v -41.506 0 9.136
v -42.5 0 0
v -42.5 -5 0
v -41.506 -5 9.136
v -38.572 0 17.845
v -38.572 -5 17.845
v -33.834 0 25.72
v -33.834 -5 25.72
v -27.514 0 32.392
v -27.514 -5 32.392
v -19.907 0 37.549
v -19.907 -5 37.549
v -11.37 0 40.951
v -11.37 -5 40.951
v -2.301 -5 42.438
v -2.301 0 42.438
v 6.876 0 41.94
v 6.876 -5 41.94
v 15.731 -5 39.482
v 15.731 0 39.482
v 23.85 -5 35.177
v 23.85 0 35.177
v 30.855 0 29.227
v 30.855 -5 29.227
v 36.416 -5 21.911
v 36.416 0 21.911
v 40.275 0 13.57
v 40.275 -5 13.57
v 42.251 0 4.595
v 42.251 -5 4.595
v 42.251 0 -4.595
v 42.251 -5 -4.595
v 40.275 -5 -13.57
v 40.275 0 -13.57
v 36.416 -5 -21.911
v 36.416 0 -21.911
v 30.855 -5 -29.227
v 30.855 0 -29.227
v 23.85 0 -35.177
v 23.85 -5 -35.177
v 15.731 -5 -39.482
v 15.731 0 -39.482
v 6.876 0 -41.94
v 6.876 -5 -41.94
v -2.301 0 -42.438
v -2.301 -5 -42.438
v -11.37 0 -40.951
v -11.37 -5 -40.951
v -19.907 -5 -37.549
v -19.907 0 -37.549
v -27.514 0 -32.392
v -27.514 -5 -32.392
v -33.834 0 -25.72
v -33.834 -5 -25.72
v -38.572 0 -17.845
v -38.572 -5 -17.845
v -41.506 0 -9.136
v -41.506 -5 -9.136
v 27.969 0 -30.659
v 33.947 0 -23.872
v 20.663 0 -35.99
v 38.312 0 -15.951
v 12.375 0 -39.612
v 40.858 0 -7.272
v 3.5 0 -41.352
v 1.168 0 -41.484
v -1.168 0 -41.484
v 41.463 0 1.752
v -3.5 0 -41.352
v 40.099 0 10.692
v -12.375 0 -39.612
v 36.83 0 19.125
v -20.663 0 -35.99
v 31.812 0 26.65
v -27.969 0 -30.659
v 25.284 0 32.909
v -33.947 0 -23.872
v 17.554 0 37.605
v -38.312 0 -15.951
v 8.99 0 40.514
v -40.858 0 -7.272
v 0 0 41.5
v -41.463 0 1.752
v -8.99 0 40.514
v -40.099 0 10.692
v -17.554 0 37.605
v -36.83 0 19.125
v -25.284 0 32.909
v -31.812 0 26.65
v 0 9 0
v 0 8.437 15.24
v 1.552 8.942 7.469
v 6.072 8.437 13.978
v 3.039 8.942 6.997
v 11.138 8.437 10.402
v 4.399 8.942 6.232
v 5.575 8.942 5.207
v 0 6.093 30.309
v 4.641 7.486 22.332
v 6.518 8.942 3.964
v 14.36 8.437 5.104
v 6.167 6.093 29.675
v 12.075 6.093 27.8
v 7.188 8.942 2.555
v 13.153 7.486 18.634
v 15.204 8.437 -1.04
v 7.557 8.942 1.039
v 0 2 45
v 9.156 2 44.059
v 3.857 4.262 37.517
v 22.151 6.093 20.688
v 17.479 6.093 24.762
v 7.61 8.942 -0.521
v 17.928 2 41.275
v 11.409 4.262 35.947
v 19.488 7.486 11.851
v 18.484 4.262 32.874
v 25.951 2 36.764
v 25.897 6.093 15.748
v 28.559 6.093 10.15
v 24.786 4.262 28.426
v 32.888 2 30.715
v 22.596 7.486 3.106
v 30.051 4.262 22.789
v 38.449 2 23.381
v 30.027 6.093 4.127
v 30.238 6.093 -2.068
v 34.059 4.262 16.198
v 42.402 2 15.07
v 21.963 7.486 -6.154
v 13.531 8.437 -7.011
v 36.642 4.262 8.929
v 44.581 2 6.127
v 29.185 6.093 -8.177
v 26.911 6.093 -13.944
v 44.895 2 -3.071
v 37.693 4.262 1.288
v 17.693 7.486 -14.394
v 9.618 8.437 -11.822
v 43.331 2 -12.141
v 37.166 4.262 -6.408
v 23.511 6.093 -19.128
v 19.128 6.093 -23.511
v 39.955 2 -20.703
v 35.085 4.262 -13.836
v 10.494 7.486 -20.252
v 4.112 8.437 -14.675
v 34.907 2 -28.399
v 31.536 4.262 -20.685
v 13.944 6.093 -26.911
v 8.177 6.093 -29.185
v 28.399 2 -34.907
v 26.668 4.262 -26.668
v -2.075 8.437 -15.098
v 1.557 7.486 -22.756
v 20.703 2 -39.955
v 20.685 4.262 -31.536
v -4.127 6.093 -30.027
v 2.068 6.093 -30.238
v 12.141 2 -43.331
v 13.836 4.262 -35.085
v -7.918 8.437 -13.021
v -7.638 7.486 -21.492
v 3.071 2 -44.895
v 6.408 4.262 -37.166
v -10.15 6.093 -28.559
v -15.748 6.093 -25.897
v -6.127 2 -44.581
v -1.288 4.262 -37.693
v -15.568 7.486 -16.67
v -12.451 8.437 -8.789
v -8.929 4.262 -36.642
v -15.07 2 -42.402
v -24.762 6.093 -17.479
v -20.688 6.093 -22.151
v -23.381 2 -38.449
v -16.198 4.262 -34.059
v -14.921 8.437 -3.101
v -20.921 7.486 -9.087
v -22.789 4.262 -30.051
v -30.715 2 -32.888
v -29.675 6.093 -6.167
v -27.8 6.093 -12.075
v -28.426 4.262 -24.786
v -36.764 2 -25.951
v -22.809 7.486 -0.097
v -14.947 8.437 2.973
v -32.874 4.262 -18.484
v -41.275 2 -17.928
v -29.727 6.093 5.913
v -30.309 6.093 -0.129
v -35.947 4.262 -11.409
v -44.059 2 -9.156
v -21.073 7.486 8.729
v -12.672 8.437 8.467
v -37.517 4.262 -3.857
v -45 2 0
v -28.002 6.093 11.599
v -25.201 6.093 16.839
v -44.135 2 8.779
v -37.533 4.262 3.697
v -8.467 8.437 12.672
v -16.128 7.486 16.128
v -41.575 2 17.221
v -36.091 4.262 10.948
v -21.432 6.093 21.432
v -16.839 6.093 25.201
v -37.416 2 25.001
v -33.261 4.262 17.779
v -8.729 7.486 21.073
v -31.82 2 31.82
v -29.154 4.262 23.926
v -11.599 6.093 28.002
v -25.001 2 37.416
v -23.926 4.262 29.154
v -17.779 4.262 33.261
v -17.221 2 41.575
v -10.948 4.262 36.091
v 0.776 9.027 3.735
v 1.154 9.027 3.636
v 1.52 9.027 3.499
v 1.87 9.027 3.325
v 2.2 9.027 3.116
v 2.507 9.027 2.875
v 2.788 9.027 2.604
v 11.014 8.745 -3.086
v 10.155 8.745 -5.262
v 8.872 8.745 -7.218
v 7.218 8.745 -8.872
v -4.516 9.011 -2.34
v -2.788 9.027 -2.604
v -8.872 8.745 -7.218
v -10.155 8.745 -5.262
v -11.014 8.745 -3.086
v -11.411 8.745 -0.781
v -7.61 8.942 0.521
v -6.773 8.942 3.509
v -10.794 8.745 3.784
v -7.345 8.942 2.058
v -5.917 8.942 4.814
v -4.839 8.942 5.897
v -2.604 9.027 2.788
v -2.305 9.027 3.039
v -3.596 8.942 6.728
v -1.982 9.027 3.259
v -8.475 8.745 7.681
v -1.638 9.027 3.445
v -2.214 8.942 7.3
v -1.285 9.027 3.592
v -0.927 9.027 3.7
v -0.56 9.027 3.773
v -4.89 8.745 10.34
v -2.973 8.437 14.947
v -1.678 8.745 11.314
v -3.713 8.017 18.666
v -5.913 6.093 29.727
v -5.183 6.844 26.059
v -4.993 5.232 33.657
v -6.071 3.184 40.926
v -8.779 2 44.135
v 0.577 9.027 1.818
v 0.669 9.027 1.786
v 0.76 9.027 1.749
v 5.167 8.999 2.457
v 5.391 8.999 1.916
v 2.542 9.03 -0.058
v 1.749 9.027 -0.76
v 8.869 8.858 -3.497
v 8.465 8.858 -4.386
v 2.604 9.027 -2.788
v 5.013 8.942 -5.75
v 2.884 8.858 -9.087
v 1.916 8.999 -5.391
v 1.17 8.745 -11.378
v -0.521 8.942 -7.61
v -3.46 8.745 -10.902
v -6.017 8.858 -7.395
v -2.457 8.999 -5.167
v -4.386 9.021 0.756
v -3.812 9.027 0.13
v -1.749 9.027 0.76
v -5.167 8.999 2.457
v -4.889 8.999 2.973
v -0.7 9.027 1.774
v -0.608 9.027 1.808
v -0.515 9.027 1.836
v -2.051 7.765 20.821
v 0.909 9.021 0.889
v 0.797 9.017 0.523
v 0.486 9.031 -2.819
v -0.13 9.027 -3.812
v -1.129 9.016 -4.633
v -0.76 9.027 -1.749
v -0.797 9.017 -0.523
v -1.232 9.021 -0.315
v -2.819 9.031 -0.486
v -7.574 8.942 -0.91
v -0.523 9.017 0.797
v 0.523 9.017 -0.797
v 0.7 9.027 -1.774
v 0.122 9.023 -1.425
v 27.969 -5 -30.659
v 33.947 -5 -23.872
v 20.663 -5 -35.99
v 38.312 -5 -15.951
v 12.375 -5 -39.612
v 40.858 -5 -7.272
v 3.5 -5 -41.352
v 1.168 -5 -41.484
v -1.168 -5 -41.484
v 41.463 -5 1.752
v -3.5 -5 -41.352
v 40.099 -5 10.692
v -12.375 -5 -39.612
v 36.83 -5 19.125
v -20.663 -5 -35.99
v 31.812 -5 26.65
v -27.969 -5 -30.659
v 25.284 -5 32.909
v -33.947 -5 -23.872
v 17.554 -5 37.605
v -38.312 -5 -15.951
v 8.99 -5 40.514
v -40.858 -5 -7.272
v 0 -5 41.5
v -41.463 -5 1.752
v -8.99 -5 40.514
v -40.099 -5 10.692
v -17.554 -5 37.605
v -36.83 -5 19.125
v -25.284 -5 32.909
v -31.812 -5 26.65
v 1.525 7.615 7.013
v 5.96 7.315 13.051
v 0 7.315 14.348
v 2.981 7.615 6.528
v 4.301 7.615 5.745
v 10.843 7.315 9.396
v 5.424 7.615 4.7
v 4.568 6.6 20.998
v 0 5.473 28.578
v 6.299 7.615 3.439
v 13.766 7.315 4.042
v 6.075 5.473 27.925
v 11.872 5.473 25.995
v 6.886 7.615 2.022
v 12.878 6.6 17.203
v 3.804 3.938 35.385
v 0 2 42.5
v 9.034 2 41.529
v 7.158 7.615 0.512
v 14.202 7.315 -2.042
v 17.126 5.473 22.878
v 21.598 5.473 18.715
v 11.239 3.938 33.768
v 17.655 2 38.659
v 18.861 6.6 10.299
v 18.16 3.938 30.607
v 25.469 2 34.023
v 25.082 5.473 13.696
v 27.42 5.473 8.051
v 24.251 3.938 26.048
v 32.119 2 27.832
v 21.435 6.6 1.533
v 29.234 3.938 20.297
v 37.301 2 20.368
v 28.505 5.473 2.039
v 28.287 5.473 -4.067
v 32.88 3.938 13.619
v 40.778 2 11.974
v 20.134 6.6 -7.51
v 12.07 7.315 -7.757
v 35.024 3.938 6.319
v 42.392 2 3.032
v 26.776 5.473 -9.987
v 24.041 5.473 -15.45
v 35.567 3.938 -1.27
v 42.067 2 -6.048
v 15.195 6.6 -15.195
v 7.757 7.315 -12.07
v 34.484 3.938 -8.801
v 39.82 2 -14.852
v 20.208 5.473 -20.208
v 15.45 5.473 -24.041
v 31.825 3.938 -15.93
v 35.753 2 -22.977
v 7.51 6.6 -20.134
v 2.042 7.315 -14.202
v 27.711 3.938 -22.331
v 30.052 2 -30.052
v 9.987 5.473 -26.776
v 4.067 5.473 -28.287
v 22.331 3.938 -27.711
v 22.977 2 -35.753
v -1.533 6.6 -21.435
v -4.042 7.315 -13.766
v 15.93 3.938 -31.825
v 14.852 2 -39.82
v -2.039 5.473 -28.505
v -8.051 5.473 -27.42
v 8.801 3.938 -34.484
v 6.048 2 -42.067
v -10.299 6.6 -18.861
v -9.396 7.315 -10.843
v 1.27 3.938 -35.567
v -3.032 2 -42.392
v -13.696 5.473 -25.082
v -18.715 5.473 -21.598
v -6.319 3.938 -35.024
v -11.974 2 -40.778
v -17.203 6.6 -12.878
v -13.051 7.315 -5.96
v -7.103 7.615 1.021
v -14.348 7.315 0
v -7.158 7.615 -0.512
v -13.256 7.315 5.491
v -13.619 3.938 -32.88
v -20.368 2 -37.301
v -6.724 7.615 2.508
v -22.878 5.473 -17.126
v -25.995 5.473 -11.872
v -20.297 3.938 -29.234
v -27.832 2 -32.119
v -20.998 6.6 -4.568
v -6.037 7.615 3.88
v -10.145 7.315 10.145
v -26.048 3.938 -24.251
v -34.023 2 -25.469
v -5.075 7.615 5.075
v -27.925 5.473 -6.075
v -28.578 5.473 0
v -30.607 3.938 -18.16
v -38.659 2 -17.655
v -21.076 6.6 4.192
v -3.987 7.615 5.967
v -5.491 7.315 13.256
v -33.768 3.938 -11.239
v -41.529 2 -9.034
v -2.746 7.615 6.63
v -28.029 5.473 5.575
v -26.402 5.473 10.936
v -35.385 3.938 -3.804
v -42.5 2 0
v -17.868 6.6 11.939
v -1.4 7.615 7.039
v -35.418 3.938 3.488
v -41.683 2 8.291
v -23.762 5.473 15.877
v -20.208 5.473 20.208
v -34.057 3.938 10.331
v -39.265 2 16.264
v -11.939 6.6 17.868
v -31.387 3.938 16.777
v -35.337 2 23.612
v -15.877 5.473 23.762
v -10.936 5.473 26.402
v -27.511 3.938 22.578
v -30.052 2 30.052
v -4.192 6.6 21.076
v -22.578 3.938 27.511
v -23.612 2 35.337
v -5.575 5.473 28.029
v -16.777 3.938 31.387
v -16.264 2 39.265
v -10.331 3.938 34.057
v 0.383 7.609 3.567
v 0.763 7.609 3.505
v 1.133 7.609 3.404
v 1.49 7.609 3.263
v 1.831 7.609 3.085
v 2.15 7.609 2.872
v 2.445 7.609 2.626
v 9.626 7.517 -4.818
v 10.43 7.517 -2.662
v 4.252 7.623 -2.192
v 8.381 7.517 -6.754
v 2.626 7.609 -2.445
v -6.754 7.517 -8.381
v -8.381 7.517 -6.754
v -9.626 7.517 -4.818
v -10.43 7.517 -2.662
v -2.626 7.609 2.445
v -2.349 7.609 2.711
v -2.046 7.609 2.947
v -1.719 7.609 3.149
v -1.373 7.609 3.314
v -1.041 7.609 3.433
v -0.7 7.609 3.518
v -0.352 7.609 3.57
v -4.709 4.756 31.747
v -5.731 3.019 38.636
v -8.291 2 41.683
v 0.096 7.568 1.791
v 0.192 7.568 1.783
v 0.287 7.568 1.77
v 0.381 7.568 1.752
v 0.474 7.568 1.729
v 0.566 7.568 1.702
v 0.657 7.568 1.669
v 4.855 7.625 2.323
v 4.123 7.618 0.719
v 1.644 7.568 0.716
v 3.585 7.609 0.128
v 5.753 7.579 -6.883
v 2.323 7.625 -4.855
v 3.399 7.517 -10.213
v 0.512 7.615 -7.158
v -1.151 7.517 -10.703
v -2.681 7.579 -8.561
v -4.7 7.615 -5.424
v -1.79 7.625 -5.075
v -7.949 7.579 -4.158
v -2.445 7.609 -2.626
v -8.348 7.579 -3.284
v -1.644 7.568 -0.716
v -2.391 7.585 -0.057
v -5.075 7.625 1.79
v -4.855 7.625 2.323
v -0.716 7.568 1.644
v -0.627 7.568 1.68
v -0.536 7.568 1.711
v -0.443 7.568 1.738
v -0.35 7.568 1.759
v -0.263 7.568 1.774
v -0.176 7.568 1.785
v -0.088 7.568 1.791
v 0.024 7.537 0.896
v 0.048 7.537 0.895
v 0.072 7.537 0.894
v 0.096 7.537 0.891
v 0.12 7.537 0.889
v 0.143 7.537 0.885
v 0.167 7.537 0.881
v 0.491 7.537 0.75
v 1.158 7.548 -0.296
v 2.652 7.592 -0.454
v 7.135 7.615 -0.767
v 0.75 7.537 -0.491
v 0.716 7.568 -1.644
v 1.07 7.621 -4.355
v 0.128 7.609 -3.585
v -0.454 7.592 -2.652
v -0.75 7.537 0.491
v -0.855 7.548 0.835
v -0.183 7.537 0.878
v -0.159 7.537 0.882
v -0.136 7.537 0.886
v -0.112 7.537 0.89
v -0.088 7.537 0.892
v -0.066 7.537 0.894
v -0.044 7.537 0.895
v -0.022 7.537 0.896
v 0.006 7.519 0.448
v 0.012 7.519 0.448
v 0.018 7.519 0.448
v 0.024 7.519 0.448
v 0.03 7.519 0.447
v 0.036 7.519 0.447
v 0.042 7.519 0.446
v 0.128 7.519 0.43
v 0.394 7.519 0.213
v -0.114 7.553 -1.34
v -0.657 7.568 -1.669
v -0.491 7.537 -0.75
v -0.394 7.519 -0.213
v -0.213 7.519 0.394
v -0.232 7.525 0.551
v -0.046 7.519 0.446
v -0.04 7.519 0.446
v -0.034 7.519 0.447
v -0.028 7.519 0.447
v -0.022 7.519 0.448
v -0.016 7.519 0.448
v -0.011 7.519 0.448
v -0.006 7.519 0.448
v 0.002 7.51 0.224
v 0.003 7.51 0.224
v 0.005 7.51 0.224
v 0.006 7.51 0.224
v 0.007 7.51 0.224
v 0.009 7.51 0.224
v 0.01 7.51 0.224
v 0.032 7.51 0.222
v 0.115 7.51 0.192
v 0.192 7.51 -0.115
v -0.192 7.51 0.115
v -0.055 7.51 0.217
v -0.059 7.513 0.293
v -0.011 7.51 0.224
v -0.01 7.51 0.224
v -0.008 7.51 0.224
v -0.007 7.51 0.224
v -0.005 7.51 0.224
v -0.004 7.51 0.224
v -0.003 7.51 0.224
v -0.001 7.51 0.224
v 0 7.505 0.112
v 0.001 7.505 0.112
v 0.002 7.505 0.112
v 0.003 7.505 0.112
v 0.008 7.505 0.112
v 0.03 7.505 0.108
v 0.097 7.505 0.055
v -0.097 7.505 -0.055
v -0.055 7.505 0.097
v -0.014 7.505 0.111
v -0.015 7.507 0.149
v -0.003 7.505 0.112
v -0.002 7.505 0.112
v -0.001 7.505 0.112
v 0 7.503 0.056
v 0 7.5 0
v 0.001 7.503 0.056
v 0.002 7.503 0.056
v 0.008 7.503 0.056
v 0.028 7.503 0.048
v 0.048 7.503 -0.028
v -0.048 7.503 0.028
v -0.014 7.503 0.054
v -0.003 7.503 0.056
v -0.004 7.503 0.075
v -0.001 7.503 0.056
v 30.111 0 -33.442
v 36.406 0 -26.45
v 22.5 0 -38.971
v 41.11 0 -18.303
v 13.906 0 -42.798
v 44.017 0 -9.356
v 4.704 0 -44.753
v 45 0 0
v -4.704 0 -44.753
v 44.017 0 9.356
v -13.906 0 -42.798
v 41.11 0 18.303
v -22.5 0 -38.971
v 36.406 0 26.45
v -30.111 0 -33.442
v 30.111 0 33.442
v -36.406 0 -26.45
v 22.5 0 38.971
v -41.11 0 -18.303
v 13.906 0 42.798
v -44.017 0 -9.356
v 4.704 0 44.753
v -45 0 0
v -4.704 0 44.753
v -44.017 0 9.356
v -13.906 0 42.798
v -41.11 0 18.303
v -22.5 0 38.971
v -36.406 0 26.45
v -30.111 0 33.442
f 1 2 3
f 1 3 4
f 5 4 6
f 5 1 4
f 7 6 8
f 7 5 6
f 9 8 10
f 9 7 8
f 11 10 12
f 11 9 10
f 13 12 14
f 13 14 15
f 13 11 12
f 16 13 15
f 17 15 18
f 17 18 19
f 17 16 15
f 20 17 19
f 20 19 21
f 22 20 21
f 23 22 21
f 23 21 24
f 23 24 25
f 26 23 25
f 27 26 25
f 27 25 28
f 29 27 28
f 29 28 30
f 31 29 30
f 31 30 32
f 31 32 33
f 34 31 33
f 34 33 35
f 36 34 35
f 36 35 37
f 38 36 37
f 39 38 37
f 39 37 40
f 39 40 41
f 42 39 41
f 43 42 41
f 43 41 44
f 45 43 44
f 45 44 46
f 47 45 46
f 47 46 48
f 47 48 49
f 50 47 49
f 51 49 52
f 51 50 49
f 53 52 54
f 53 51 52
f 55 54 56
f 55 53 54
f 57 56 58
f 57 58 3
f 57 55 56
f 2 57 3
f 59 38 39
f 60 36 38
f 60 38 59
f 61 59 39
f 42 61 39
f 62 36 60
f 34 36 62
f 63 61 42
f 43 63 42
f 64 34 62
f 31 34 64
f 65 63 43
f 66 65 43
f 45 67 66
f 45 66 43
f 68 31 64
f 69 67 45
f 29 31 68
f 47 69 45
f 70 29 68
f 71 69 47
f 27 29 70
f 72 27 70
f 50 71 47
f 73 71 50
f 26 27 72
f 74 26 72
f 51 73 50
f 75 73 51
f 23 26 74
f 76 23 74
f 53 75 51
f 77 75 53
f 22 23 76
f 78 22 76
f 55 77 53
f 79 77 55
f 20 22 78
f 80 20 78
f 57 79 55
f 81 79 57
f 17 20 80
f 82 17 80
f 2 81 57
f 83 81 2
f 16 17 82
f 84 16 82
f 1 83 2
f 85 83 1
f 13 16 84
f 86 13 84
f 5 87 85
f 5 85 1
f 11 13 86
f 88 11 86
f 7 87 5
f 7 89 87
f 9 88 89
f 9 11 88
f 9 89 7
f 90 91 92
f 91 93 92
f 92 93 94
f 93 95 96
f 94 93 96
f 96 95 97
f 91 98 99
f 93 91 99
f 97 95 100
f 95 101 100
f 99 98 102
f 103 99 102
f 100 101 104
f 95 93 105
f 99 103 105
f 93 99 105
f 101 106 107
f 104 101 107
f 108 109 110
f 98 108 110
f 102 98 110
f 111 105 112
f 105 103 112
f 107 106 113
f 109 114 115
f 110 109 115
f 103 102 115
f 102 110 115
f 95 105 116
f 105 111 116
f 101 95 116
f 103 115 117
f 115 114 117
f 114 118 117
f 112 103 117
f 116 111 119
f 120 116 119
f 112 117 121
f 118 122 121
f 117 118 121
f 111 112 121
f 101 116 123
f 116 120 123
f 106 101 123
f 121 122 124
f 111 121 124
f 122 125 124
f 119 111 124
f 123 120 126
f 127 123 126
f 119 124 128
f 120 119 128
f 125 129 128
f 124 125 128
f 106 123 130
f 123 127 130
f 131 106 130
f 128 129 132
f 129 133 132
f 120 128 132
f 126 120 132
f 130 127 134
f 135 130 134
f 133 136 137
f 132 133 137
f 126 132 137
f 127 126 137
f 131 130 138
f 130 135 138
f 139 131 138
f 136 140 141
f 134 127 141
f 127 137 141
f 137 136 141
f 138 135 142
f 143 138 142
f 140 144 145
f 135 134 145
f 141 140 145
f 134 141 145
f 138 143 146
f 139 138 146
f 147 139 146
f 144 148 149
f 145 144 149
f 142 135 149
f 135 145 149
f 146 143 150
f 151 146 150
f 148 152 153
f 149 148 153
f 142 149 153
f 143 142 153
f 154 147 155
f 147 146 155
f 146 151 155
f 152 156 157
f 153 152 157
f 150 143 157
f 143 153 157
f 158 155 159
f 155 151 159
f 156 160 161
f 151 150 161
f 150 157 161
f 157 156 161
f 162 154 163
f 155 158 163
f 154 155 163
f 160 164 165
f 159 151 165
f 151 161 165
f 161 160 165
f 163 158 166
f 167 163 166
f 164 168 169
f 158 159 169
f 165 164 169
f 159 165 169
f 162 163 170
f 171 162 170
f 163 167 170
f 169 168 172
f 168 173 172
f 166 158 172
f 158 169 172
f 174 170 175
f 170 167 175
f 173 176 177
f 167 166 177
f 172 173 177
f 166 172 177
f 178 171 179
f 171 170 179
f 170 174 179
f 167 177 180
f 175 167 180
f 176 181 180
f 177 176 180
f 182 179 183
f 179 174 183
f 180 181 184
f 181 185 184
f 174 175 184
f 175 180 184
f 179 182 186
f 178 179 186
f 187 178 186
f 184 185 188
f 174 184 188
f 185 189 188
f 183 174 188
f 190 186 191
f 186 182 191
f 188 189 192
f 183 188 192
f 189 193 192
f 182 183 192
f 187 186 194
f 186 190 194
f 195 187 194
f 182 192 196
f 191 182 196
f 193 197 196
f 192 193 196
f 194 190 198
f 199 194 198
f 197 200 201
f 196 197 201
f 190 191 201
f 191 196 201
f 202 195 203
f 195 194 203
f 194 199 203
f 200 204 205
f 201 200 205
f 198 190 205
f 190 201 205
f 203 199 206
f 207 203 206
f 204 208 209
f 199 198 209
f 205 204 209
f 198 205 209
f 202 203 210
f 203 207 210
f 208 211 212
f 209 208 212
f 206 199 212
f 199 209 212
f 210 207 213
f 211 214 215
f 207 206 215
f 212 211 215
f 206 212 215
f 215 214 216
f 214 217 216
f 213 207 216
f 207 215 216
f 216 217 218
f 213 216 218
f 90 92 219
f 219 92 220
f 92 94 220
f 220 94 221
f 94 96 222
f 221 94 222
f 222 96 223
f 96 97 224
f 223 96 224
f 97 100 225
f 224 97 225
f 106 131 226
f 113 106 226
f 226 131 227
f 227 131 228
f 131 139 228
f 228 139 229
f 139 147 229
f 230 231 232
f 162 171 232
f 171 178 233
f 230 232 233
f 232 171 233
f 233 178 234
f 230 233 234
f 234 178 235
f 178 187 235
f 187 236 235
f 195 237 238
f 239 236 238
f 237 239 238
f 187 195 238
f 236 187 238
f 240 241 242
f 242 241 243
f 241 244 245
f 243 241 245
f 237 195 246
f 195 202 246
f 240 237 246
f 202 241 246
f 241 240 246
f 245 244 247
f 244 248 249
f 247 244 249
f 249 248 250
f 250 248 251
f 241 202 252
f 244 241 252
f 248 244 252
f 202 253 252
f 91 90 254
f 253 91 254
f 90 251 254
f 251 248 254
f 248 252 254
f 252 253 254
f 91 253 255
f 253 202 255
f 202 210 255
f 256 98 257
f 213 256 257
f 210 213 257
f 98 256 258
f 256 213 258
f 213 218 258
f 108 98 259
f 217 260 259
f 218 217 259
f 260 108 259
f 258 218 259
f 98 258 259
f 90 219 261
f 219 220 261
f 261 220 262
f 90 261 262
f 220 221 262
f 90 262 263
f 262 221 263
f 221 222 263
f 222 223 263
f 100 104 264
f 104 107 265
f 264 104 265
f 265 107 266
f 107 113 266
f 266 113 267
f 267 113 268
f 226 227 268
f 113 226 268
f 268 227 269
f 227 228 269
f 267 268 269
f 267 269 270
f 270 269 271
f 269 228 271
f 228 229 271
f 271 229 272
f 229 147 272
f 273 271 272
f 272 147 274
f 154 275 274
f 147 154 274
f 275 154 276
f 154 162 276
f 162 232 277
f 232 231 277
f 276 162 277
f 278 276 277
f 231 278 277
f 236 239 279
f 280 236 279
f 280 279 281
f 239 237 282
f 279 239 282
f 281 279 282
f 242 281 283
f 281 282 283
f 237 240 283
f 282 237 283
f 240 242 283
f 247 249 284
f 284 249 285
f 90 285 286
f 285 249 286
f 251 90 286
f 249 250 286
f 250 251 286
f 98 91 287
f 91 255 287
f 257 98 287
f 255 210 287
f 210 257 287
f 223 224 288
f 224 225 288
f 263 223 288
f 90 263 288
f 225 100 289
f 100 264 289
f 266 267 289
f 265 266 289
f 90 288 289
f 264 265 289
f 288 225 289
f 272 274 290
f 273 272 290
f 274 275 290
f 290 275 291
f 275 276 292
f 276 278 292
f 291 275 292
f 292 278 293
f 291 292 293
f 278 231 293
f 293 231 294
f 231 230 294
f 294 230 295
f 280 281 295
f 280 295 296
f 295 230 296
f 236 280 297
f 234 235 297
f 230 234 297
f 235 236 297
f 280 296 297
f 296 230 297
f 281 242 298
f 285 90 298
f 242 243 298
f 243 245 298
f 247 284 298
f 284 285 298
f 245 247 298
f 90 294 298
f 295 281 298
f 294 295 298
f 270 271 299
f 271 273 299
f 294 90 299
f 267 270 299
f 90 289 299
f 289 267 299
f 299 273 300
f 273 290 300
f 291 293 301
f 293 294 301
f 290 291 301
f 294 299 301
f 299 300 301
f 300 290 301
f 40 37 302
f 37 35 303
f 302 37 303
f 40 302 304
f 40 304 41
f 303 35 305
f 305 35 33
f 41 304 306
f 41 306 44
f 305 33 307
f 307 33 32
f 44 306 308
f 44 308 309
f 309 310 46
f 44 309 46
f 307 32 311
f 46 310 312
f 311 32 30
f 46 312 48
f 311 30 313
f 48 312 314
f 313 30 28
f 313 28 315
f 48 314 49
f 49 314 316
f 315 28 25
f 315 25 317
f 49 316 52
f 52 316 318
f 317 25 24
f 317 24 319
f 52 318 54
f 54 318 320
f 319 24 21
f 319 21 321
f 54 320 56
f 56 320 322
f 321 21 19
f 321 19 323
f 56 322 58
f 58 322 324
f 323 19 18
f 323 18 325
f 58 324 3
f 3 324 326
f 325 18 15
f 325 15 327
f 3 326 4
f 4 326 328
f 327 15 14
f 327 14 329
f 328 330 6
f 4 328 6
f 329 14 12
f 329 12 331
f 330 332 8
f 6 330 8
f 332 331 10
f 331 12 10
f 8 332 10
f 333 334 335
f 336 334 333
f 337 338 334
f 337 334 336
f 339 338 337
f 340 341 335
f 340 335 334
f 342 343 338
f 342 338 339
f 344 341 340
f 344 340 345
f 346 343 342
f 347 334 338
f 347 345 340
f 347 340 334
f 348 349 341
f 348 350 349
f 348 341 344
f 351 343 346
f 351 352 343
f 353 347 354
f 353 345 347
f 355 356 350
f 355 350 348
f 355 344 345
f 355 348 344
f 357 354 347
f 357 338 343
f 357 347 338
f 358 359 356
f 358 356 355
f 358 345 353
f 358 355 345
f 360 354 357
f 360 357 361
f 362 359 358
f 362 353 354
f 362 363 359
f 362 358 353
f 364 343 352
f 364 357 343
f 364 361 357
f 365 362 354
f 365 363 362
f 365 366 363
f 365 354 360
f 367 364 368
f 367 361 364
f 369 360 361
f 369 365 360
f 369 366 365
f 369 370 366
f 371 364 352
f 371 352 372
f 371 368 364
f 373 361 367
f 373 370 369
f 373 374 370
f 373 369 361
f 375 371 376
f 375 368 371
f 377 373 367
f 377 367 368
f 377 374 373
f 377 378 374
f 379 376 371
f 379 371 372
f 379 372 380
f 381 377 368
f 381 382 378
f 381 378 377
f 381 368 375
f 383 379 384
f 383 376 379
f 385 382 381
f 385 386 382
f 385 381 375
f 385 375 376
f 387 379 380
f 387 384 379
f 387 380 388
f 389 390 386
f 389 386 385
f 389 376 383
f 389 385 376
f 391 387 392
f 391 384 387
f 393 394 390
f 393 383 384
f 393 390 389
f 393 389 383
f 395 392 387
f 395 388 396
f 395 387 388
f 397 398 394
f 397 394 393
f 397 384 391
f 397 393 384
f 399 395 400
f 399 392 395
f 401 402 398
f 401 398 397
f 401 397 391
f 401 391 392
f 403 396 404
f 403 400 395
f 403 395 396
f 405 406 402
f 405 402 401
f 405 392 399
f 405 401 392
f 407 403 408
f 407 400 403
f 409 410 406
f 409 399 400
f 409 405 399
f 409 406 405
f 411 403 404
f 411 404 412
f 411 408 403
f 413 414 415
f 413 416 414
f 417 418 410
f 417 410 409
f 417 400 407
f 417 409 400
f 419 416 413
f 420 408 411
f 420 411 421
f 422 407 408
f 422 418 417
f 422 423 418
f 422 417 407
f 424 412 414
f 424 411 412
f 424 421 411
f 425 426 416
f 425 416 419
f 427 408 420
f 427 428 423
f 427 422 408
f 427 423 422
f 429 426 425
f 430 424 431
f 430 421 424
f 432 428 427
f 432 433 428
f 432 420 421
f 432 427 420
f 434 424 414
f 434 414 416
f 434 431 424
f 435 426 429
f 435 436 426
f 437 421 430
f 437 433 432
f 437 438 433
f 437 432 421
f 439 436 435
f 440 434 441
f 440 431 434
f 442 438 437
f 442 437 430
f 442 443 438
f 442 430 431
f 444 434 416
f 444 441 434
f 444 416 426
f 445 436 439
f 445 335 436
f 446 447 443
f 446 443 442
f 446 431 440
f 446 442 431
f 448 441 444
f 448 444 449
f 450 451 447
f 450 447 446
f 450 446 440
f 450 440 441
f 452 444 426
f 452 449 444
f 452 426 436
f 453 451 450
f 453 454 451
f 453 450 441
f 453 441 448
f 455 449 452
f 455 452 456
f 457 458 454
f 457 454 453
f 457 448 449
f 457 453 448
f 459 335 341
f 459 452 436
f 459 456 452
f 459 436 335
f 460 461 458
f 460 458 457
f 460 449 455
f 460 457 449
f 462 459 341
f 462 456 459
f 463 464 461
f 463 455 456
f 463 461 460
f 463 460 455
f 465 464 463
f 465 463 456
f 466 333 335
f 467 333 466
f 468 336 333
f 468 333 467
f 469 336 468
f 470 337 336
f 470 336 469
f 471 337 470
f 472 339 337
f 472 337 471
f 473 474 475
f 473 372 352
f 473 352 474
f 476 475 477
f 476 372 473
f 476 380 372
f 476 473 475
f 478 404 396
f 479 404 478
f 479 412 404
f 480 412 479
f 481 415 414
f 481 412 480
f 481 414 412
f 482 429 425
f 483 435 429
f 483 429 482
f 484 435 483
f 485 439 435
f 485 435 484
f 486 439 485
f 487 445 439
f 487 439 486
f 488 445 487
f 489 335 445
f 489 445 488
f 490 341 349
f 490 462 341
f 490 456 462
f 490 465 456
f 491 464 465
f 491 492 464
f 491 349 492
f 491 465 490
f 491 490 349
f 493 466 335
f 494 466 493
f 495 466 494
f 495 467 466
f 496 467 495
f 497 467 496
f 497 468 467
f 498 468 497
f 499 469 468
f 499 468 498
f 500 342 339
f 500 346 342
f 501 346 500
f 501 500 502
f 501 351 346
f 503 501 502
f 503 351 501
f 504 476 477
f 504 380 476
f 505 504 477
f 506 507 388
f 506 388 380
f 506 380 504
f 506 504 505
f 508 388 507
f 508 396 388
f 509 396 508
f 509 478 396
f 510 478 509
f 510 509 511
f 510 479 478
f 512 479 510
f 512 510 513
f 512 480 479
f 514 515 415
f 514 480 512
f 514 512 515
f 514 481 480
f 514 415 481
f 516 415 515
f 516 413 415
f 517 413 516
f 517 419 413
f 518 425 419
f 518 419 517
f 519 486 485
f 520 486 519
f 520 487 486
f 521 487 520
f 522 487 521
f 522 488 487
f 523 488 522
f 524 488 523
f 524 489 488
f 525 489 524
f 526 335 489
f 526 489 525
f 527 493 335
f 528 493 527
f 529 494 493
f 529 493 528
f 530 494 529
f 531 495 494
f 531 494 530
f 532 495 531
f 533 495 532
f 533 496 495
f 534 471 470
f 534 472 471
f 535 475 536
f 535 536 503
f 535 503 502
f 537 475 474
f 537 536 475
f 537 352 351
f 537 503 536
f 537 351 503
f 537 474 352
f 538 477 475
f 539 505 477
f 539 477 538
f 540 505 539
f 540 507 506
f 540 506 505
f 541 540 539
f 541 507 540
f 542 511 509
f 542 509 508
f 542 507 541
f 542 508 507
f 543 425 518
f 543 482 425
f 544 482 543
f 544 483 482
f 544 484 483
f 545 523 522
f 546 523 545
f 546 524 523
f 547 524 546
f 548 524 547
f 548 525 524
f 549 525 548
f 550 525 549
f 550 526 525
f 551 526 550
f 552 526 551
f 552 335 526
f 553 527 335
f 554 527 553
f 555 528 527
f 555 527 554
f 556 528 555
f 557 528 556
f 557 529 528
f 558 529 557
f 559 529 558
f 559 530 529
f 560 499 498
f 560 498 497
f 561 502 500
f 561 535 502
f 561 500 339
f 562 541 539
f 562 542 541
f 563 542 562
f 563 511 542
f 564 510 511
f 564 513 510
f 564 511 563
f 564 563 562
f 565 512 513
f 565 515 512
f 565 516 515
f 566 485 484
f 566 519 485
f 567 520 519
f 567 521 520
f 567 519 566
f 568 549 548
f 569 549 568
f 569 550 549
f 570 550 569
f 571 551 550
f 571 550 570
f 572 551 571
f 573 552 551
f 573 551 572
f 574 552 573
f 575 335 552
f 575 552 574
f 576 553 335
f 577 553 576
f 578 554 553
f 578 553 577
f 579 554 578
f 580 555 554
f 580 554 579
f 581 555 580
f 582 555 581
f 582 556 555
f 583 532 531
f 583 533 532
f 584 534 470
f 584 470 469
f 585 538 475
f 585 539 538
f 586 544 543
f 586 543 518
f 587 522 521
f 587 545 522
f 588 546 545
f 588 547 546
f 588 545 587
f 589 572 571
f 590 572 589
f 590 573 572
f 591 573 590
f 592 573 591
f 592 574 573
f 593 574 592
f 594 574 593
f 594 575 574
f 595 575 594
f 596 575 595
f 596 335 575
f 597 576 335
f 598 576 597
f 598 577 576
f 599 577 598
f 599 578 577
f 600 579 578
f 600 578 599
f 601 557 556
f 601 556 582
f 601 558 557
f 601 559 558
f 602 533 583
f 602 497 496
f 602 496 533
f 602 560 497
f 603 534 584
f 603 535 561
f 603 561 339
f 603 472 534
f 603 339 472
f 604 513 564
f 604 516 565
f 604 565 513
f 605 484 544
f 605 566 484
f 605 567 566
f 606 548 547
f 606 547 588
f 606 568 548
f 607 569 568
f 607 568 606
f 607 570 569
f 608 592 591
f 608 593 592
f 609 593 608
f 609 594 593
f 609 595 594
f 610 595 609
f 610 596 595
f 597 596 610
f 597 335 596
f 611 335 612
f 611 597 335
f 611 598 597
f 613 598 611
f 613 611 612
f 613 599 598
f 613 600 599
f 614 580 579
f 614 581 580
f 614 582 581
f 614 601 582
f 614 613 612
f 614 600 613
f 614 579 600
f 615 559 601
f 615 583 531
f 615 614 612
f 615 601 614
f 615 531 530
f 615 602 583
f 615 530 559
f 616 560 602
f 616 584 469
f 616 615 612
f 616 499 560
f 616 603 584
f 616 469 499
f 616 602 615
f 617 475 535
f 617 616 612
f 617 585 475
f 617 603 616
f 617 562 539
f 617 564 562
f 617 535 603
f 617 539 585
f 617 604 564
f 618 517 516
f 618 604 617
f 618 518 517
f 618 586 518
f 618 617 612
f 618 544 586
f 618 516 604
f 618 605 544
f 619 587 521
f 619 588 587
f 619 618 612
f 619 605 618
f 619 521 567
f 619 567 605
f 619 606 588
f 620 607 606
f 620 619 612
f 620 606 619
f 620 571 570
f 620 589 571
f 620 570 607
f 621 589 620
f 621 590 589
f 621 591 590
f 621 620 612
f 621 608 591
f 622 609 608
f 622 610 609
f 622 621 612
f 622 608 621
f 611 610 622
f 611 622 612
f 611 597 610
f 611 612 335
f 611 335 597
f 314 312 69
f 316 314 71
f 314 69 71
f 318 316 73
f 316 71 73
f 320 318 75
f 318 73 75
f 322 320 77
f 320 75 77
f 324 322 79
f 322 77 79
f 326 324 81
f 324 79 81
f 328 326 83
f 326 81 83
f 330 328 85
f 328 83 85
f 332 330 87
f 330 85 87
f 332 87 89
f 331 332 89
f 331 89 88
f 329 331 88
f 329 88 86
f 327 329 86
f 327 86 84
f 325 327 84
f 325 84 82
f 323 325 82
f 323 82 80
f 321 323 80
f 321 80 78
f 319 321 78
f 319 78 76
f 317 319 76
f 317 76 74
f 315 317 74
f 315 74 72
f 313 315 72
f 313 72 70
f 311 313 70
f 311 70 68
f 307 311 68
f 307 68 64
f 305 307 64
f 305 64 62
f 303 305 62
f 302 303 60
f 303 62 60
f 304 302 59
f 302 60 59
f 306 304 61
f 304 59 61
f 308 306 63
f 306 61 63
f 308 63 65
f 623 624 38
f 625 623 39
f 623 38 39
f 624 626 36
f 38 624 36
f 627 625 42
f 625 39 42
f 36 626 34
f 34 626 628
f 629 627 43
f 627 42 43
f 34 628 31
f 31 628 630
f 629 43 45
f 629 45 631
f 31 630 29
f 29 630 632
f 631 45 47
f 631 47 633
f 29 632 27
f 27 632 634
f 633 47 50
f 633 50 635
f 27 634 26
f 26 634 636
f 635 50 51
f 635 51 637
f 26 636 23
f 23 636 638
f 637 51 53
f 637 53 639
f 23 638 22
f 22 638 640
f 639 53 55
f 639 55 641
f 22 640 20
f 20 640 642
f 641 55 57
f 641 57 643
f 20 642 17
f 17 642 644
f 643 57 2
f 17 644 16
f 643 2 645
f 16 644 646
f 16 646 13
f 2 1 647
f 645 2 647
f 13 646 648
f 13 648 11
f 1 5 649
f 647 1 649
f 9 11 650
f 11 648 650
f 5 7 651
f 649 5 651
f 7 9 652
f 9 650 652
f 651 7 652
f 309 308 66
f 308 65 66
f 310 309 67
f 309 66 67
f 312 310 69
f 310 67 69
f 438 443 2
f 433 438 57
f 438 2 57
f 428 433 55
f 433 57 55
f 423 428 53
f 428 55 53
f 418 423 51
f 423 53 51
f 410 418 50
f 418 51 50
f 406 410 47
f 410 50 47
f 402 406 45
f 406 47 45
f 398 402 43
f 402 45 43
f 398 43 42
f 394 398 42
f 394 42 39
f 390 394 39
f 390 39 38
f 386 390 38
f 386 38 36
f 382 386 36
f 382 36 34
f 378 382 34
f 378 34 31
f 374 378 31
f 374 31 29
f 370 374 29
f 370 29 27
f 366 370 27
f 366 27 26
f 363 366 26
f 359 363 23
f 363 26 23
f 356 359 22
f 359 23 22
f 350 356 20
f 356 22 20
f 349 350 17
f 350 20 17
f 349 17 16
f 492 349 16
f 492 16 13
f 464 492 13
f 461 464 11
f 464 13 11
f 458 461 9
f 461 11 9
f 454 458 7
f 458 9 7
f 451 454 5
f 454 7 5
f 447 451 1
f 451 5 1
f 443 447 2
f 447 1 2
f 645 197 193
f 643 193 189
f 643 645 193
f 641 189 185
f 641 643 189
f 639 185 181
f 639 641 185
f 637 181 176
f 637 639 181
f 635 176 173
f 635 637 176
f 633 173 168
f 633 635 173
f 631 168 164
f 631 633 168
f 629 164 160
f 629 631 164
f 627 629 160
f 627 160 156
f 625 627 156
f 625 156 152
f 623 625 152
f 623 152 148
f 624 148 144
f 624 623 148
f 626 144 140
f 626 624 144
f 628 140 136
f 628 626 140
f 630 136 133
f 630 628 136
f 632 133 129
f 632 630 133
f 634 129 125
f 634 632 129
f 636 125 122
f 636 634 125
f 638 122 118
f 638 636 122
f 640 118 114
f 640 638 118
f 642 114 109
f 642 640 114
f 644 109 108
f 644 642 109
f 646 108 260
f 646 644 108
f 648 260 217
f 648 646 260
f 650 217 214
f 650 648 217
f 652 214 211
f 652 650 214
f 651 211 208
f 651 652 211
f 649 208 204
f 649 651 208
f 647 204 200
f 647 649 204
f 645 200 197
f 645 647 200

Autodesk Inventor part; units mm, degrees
ref_plane "YZ Plane" through (0, 0, 0) normal (1, 0, 0) x (0, 1, 0)
ref_plane "XZ Plane" through (0, 0, 0) normal (0, 1, 0) x (-1, 0, 0)
ref_plane "XY Plane" through (0, 0, 0) normal (0, 0, 1) x (1, 0, 0)
sketch "Sketch1" plane through (0, 0, 0) normal (0, 1, 0) x (-1, 0, 0)
  circle A0 centre (0, 0) radius 45
  arc A1 (3.5, -41.3521) -> (-3.5, -41.3521) centre (0, 0) ccw
  circle A2 centre (0, 0) radius 42.5
  circle A3 centre (0, 0) radius 41.5
  point P0 (3.5, -41.3521)
  point P1 (-3.5, -41.3521)
  point P2 (3.5, -41.3521)
  point P3 (-3.5, -41.3521)
  dimension "d0" = 90
  dimension "d1" = 85
  dimension "d9" = 41.5
extrude "Extrusion1" add sketch "Sketch1" along normal blind 2 contours A0
extrude "Extrusion2" add sketch "Sketch1" against normal blind 5 contours A2
sketch "Sketch2" plane through (0, 0, 0) normal (1, 0, 0) x (0, 1, 0)
  line L0 (0, 0) -> (9, 0)
  line L1 (2, -45) -> (2, 45) projected
  arc A0 (9, 0) -> (2, 45) centre (-120.9693, 2.827) ccw
  line L2 (9, 0) -> (7.5, 0)
  line L3 (2, 42.5) -> (0, 42.5) projected
  arc A1 (7.5, 0) -> (2, 42.5) centre (-116.3746, 5.5751) ccw
  line L4 (0, -63.0618) -> (0, 63.3707) projected
  line L5 (-147.3603, 0) -> (37.3769, 0) projected
  dimension "d14" = 9
  dimension "d15" = 130
  dimension "d16" = 1.5
  dimension "d17" = 124
revolve "Revolution1" add sketch "Sketch2" angle 360 about axis through (0, -10, 0) along (0, 1, 0) contours A1 L1 A0 L0
properties part number "_3DPrint"
